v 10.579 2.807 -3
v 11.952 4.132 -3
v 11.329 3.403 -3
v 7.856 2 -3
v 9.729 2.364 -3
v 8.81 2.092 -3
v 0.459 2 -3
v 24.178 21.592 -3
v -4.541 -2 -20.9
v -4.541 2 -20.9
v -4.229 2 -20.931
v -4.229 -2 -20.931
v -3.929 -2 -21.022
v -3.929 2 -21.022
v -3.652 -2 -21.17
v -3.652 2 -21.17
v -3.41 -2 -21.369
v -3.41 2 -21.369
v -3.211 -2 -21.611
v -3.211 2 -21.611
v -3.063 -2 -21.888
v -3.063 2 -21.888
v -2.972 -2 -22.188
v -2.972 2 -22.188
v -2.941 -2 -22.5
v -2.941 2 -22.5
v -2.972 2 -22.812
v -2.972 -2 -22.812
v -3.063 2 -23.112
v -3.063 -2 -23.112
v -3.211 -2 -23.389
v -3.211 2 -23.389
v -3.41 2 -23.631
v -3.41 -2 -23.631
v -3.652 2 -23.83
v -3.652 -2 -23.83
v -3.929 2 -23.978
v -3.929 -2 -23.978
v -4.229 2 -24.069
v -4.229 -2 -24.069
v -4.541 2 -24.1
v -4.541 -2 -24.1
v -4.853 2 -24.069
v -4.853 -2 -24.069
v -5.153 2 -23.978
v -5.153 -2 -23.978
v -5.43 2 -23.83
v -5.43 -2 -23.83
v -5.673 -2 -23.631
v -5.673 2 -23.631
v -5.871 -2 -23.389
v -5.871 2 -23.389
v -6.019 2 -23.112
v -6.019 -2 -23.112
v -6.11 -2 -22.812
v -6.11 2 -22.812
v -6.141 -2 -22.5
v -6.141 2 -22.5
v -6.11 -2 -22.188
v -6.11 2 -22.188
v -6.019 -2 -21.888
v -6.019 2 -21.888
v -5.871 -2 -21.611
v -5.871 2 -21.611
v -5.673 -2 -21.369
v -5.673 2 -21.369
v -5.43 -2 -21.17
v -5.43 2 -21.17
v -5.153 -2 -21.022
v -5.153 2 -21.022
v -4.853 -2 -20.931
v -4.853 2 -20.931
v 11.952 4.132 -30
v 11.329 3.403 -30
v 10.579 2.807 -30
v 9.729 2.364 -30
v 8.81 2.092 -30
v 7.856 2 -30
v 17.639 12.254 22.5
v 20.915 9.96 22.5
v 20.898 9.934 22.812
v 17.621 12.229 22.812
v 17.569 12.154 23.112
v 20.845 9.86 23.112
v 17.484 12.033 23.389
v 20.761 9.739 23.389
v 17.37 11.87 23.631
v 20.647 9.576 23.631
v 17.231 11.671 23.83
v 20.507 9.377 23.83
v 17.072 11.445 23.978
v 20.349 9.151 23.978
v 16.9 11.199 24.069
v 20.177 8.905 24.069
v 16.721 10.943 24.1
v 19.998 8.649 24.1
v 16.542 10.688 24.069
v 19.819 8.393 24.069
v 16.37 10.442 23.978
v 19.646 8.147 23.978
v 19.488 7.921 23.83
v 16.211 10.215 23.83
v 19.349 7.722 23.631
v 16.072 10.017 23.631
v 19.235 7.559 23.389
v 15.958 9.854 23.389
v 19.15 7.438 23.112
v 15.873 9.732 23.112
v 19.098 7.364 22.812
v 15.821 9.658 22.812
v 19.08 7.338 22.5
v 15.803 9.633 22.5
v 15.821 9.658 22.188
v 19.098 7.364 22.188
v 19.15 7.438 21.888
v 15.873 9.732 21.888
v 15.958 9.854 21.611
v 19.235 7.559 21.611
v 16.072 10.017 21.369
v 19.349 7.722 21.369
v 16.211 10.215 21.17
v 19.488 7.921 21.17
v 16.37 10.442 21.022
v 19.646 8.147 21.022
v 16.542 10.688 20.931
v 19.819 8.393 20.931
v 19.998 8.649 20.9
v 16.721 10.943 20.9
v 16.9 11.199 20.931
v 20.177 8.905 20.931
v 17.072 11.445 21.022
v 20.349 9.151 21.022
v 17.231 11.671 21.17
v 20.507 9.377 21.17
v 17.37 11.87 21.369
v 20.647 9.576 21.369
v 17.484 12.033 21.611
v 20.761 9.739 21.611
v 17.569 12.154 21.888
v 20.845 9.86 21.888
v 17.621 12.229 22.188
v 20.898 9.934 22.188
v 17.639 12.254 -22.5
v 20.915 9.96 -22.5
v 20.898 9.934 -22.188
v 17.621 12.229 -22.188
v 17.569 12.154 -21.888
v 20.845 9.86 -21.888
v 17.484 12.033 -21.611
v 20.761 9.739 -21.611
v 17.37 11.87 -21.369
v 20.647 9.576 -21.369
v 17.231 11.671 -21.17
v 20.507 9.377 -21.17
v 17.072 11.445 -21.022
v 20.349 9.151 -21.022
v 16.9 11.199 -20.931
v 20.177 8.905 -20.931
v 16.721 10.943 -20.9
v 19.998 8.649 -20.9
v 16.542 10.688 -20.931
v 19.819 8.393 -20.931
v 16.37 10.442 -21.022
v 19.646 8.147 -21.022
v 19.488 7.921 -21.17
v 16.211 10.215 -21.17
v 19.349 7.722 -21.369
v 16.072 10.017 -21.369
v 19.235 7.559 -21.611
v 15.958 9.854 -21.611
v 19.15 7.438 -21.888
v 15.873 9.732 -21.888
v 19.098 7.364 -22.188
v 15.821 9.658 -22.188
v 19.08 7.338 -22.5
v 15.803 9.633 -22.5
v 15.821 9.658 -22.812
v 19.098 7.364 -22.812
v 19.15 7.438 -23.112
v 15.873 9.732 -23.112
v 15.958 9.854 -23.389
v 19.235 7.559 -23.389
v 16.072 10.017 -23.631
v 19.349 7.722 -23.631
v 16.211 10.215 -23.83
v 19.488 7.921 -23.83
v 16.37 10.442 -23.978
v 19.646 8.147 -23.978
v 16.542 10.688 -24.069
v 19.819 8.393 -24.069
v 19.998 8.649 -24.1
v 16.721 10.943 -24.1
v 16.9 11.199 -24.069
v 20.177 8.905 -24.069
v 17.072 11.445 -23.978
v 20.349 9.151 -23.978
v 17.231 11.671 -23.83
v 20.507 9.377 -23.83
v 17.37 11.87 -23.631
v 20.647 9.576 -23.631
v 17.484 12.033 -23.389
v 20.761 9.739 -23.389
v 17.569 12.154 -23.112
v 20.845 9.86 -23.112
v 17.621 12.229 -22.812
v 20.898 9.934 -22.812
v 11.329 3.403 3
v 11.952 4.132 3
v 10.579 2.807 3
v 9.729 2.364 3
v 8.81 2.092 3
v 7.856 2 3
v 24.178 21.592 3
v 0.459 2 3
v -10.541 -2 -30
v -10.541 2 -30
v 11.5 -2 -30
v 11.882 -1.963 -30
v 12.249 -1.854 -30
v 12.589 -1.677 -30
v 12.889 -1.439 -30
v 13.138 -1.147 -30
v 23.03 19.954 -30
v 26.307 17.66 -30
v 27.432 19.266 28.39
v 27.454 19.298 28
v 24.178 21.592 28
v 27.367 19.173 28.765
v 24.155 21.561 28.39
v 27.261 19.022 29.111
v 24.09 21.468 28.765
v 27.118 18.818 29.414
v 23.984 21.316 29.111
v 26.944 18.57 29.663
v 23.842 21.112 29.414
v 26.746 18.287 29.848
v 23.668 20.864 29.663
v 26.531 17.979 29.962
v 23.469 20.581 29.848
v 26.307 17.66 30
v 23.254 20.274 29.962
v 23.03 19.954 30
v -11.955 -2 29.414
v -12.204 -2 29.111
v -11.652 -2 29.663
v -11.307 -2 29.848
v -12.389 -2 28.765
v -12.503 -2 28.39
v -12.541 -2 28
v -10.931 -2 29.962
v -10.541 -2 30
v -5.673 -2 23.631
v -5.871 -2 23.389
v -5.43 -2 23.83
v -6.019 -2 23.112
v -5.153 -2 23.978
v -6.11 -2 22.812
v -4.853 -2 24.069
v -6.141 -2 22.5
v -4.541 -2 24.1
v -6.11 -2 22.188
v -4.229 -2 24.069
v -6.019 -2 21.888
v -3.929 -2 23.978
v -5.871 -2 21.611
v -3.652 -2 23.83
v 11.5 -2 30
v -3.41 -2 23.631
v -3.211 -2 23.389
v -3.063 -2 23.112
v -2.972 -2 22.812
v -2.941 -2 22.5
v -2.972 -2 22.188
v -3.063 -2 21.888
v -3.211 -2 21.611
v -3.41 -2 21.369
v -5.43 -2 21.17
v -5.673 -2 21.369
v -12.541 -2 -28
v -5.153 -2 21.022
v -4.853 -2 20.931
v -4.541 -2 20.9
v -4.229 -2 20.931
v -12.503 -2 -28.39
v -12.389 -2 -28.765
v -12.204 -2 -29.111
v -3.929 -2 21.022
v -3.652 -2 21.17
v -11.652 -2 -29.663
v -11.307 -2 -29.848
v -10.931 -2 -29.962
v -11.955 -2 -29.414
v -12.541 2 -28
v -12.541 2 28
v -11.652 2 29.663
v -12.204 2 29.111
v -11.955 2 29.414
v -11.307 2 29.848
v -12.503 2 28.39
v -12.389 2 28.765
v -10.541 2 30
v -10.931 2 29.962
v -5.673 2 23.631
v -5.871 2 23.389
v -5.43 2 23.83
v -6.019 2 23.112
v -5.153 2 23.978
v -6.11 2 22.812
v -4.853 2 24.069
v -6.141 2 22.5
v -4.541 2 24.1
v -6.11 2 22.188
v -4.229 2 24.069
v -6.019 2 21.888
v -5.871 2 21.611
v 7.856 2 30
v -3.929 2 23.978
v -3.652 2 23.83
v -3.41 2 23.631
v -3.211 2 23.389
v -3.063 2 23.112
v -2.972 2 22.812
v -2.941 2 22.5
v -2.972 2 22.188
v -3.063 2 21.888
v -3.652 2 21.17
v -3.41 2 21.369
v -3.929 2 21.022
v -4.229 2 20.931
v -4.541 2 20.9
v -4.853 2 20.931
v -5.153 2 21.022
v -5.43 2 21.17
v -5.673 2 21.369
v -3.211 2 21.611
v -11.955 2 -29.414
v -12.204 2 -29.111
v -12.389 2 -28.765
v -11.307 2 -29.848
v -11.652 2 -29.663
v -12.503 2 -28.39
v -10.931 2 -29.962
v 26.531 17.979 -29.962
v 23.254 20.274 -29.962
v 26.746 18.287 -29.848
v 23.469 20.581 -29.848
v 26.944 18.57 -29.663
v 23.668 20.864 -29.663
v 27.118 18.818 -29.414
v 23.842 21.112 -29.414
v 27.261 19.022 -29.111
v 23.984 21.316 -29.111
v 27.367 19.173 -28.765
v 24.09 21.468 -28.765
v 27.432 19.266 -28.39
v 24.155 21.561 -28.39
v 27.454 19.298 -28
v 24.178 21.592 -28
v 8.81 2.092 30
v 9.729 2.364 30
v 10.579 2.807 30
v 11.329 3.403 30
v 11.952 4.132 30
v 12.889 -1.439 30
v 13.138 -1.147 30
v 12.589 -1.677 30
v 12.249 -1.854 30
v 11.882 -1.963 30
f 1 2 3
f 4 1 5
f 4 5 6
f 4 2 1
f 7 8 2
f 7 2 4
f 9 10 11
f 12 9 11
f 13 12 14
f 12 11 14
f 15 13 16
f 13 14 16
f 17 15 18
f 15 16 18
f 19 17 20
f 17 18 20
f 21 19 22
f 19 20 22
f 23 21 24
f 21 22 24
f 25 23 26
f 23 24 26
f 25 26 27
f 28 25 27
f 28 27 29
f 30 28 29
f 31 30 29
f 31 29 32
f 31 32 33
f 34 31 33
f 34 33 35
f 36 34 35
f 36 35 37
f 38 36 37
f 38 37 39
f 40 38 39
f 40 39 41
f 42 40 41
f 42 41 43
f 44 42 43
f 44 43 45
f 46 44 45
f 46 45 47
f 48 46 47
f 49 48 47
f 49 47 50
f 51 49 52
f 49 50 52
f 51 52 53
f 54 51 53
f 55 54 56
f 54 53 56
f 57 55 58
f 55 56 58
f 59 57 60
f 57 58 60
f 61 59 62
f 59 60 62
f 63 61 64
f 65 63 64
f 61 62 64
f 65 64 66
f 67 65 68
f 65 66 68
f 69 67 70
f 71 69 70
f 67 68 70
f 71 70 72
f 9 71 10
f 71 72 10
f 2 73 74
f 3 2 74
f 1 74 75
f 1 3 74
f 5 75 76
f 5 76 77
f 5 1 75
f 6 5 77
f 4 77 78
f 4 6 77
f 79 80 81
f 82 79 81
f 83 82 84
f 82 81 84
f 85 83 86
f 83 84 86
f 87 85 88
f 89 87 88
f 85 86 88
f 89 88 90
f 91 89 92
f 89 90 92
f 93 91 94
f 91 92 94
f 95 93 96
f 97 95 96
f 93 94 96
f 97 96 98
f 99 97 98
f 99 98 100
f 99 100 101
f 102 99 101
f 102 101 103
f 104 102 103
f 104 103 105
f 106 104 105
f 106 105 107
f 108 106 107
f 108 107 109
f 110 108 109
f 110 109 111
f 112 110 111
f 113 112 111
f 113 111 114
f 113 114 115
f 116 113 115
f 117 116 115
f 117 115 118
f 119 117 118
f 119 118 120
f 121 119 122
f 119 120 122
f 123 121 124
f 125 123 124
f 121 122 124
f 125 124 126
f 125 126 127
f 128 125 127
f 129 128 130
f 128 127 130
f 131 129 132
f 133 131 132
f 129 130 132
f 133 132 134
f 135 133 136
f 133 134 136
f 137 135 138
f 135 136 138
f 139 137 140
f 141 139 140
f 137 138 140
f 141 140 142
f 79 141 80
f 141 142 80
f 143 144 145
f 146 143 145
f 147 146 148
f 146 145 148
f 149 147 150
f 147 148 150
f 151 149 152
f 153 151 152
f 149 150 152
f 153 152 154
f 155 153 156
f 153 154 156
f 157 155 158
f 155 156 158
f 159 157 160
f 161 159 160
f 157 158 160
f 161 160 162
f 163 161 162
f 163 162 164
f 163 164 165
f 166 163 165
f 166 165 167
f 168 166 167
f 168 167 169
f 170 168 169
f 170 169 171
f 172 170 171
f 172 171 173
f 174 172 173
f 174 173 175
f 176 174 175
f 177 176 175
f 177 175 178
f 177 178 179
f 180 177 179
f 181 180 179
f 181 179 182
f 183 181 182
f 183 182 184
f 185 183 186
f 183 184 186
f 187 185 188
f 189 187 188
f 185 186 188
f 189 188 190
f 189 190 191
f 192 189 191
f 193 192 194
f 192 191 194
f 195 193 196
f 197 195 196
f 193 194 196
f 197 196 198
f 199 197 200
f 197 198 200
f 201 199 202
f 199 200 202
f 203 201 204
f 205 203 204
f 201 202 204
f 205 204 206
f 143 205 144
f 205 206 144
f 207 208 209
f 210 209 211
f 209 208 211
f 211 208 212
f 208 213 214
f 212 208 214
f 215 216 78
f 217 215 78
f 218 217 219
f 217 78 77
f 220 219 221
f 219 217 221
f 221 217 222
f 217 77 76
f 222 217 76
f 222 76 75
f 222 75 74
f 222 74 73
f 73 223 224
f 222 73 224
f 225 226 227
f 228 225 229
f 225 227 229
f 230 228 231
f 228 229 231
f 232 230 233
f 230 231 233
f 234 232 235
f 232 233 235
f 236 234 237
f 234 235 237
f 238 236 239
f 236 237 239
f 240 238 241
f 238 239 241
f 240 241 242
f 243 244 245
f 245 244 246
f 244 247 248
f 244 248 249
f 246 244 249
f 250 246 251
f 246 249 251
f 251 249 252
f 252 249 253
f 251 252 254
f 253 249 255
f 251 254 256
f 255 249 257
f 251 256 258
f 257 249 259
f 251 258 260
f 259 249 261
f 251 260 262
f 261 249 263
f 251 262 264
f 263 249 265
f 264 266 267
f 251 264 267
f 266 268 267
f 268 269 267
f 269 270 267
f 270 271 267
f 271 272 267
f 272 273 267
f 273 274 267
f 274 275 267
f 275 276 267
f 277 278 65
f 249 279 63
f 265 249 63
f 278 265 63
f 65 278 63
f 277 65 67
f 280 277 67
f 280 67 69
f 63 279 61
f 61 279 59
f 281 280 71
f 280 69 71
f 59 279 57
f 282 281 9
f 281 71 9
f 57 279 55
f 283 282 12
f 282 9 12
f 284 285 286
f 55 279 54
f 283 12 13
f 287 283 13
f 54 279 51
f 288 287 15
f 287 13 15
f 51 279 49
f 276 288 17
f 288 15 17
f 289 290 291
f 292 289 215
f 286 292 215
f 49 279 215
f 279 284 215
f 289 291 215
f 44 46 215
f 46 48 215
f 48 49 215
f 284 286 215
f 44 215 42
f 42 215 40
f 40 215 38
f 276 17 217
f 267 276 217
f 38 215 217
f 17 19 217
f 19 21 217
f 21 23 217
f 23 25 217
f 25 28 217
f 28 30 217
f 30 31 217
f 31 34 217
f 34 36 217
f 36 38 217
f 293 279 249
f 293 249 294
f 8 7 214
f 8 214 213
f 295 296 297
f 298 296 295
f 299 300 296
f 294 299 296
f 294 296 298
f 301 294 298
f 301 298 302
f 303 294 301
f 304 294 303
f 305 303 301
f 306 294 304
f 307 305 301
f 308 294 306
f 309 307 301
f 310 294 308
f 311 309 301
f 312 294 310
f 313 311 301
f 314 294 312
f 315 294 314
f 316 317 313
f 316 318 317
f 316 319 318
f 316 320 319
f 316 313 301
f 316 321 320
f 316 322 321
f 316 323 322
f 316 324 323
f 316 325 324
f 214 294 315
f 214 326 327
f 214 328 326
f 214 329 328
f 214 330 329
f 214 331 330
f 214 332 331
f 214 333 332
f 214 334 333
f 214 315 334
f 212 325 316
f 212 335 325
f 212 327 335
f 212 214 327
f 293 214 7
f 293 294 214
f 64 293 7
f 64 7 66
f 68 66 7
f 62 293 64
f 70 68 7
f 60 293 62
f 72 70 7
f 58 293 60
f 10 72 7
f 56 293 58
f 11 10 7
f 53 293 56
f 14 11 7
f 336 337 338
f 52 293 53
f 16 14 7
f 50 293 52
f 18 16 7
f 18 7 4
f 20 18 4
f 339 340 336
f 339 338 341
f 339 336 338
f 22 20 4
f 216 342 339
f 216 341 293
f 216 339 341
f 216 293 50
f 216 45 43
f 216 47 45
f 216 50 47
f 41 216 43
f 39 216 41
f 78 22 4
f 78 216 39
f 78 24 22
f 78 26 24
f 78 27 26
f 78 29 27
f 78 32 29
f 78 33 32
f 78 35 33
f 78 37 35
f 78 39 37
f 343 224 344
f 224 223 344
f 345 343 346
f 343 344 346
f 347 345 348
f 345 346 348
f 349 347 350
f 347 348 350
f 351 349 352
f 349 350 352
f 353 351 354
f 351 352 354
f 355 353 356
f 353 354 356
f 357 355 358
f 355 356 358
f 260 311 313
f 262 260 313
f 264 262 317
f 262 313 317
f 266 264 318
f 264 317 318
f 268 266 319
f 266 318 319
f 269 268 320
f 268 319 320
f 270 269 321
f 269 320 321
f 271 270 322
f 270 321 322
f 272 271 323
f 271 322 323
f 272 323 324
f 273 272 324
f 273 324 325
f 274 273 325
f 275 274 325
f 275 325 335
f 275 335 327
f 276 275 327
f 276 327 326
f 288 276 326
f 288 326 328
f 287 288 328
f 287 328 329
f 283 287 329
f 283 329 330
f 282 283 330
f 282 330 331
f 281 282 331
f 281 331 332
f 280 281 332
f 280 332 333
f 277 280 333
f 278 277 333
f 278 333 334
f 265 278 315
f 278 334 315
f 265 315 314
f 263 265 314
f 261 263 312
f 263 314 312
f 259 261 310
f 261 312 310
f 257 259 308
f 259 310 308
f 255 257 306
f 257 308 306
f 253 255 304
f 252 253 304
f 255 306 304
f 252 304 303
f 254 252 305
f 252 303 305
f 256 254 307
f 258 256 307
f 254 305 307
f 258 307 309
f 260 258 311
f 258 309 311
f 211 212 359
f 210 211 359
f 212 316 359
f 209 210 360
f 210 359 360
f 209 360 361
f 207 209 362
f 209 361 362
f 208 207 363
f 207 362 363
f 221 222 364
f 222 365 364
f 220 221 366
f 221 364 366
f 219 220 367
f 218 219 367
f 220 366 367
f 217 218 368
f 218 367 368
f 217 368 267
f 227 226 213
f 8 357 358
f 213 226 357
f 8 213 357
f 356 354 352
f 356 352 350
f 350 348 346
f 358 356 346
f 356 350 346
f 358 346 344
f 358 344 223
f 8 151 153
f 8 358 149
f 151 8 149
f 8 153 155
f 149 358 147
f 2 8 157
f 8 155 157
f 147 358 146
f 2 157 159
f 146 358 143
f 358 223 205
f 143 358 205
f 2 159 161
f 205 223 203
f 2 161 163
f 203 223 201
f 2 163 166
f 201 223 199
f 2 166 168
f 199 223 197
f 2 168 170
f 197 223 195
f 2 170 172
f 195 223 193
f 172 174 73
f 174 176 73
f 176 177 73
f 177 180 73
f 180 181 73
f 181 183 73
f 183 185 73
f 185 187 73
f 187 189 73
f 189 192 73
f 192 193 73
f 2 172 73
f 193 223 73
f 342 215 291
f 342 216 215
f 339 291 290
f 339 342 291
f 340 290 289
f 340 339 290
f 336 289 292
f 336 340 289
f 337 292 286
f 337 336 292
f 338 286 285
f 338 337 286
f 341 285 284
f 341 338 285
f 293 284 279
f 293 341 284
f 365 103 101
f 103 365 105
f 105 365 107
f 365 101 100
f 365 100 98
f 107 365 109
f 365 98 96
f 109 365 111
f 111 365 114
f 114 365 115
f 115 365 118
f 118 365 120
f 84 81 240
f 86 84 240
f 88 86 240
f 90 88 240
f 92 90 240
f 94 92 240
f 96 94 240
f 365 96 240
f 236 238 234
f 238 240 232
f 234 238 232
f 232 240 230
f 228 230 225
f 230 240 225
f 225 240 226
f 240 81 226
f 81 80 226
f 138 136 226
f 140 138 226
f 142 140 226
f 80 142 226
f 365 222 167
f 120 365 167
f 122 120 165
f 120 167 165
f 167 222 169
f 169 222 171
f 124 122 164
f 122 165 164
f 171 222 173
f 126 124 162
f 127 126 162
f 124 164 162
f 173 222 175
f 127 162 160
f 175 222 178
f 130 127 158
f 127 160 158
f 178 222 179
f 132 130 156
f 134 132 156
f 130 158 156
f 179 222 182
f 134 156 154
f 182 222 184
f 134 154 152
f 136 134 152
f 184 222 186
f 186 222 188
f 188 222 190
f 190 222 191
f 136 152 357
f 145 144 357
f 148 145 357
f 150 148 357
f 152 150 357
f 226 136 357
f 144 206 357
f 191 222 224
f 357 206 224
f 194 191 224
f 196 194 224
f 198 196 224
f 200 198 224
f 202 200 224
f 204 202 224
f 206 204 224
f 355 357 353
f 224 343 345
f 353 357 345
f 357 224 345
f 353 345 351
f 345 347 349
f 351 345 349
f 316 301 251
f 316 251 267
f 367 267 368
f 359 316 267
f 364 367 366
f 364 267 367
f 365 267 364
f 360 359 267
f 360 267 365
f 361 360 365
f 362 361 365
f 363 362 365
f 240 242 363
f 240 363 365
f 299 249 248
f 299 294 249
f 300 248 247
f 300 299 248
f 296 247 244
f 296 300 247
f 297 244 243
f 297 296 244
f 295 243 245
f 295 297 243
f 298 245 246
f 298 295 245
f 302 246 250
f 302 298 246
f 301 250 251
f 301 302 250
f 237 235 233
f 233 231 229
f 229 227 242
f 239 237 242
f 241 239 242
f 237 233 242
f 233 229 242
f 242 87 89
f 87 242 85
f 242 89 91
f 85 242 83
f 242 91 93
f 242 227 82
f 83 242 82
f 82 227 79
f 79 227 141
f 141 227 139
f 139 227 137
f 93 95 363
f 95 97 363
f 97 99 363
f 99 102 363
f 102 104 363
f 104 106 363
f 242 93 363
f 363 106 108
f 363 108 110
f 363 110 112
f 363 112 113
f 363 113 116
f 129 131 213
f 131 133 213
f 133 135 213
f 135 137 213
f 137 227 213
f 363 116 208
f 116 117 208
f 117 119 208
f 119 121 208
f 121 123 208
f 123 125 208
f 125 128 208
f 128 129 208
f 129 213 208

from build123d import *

# Parameters (mm, degrees)
BOSS_EXTRUDE1_DEPTH      = 30
BOSS_EXTRUDE1_DEPTH_BACK = 30
BOSS_EXTRUDE2_DEPTH      = 3
BOSS_EXTRUDE2_DEPTH_BACK = 3
SKETCH3_R                = 1.6
CUT_EXTRUDE1_DEPTH       = 47.598772642
SKETCH4_R                = 1.6
CUT_EXTRUDE2_DEPTH       = 46.1396211
FILLET1_R                = 5
FILLET2_R                = 2
FILLET3_R                = 2


with BuildPart() as part:
    # Sketch1 → Boss-Extrude1 (new, two sides: drawn at the far end of the back side and taken through both)
    with BuildSketch(Plane.XY.offset(-BOSS_EXTRUDE1_DEPTH_BACK)):
        Polygon((24.177513269, 21.592258897), (10.458865899, 2), (-12.541134101, 2), (-12.541134101, -2), (12.541134101, -2), (27.454121446, 19.297953152), align=None)
    extrude(amount=BOSS_EXTRUDE1_DEPTH + BOSS_EXTRUDE1_DEPTH_BACK)

    # Sketch2 → Boss-Extrude2 (add, two sides: drawn at the far end of the back side and taken through both)
    with BuildSketch(Plane.XY.offset(-BOSS_EXTRUDE2_DEPTH_BACK)):
        Polygon((10.458865899, 2), (24.177513269, 21.592258897), (0.458865899, 2), align=None)
    extrude(amount=BOSS_EXTRUDE2_DEPTH + BOSS_EXTRUDE2_DEPTH_BACK)

    # Sketch3 → Cut-Extrude1 (cut, through all)
    with BuildSketch(Plane(origin=(9.354919913, -6.550385442, 0), x_dir=(0, 0, -1), z_dir=(0.8191520442889935, -0.5735764363510437, 0))):
        with Locations((-22.5, 18.554994917)):
            Circle(SKETCH3_R)
        with Locations((22.5, 18.554994917)):
            Circle(SKETCH3_R)
    extrude(amount=-CUT_EXTRUDE1_DEPTH, mode=Mode.SUBTRACT)

    # Sketch4 → Cut-Extrude2 (cut, through all)
    with BuildSketch(Plane(origin=(0, 2, 0), x_dir=(1, 0, 0), z_dir=(0, 1, 0))):
        with Locations((-4.541134101, 22.5)):
            Circle(SKETCH4_R)
        with Locations((-4.541134101, -22.5)):
            Circle(SKETCH4_R)
    extrude(amount=-CUT_EXTRUDE2_DEPTH, mode=Mode.SUBTRACT)

    # Fillet1
    fillet1_edges = [part.edges().sort_by_distance(p)[0] for p in [
        (10.458865899, 2, 16.5),
        (10.458865899, 2, -16.5),
    ]]
    fillet(fillet1_edges, radius=FILLET1_R)

    # Fillet2
    fillet2_edges = [part.edges().sort_by_distance(p)[0] for p in [
        (25.815817358, 20.445106024, -30),
        (25.815817358, 20.445106024, 30),
        (12.541134101, -2, 0),
    ]]
    fillet(fillet2_edges, radius=FILLET2_R)

    # Fillet3
    fillet3_edges = [part.edges().sort_by_distance(p)[0] for p in [
        (-12.541134101, 0, -30),
        (-12.541134101, 0, 30),
    ]]
    fillet(fillet3_edges, radius=FILLET3_R)


solid = part.part
